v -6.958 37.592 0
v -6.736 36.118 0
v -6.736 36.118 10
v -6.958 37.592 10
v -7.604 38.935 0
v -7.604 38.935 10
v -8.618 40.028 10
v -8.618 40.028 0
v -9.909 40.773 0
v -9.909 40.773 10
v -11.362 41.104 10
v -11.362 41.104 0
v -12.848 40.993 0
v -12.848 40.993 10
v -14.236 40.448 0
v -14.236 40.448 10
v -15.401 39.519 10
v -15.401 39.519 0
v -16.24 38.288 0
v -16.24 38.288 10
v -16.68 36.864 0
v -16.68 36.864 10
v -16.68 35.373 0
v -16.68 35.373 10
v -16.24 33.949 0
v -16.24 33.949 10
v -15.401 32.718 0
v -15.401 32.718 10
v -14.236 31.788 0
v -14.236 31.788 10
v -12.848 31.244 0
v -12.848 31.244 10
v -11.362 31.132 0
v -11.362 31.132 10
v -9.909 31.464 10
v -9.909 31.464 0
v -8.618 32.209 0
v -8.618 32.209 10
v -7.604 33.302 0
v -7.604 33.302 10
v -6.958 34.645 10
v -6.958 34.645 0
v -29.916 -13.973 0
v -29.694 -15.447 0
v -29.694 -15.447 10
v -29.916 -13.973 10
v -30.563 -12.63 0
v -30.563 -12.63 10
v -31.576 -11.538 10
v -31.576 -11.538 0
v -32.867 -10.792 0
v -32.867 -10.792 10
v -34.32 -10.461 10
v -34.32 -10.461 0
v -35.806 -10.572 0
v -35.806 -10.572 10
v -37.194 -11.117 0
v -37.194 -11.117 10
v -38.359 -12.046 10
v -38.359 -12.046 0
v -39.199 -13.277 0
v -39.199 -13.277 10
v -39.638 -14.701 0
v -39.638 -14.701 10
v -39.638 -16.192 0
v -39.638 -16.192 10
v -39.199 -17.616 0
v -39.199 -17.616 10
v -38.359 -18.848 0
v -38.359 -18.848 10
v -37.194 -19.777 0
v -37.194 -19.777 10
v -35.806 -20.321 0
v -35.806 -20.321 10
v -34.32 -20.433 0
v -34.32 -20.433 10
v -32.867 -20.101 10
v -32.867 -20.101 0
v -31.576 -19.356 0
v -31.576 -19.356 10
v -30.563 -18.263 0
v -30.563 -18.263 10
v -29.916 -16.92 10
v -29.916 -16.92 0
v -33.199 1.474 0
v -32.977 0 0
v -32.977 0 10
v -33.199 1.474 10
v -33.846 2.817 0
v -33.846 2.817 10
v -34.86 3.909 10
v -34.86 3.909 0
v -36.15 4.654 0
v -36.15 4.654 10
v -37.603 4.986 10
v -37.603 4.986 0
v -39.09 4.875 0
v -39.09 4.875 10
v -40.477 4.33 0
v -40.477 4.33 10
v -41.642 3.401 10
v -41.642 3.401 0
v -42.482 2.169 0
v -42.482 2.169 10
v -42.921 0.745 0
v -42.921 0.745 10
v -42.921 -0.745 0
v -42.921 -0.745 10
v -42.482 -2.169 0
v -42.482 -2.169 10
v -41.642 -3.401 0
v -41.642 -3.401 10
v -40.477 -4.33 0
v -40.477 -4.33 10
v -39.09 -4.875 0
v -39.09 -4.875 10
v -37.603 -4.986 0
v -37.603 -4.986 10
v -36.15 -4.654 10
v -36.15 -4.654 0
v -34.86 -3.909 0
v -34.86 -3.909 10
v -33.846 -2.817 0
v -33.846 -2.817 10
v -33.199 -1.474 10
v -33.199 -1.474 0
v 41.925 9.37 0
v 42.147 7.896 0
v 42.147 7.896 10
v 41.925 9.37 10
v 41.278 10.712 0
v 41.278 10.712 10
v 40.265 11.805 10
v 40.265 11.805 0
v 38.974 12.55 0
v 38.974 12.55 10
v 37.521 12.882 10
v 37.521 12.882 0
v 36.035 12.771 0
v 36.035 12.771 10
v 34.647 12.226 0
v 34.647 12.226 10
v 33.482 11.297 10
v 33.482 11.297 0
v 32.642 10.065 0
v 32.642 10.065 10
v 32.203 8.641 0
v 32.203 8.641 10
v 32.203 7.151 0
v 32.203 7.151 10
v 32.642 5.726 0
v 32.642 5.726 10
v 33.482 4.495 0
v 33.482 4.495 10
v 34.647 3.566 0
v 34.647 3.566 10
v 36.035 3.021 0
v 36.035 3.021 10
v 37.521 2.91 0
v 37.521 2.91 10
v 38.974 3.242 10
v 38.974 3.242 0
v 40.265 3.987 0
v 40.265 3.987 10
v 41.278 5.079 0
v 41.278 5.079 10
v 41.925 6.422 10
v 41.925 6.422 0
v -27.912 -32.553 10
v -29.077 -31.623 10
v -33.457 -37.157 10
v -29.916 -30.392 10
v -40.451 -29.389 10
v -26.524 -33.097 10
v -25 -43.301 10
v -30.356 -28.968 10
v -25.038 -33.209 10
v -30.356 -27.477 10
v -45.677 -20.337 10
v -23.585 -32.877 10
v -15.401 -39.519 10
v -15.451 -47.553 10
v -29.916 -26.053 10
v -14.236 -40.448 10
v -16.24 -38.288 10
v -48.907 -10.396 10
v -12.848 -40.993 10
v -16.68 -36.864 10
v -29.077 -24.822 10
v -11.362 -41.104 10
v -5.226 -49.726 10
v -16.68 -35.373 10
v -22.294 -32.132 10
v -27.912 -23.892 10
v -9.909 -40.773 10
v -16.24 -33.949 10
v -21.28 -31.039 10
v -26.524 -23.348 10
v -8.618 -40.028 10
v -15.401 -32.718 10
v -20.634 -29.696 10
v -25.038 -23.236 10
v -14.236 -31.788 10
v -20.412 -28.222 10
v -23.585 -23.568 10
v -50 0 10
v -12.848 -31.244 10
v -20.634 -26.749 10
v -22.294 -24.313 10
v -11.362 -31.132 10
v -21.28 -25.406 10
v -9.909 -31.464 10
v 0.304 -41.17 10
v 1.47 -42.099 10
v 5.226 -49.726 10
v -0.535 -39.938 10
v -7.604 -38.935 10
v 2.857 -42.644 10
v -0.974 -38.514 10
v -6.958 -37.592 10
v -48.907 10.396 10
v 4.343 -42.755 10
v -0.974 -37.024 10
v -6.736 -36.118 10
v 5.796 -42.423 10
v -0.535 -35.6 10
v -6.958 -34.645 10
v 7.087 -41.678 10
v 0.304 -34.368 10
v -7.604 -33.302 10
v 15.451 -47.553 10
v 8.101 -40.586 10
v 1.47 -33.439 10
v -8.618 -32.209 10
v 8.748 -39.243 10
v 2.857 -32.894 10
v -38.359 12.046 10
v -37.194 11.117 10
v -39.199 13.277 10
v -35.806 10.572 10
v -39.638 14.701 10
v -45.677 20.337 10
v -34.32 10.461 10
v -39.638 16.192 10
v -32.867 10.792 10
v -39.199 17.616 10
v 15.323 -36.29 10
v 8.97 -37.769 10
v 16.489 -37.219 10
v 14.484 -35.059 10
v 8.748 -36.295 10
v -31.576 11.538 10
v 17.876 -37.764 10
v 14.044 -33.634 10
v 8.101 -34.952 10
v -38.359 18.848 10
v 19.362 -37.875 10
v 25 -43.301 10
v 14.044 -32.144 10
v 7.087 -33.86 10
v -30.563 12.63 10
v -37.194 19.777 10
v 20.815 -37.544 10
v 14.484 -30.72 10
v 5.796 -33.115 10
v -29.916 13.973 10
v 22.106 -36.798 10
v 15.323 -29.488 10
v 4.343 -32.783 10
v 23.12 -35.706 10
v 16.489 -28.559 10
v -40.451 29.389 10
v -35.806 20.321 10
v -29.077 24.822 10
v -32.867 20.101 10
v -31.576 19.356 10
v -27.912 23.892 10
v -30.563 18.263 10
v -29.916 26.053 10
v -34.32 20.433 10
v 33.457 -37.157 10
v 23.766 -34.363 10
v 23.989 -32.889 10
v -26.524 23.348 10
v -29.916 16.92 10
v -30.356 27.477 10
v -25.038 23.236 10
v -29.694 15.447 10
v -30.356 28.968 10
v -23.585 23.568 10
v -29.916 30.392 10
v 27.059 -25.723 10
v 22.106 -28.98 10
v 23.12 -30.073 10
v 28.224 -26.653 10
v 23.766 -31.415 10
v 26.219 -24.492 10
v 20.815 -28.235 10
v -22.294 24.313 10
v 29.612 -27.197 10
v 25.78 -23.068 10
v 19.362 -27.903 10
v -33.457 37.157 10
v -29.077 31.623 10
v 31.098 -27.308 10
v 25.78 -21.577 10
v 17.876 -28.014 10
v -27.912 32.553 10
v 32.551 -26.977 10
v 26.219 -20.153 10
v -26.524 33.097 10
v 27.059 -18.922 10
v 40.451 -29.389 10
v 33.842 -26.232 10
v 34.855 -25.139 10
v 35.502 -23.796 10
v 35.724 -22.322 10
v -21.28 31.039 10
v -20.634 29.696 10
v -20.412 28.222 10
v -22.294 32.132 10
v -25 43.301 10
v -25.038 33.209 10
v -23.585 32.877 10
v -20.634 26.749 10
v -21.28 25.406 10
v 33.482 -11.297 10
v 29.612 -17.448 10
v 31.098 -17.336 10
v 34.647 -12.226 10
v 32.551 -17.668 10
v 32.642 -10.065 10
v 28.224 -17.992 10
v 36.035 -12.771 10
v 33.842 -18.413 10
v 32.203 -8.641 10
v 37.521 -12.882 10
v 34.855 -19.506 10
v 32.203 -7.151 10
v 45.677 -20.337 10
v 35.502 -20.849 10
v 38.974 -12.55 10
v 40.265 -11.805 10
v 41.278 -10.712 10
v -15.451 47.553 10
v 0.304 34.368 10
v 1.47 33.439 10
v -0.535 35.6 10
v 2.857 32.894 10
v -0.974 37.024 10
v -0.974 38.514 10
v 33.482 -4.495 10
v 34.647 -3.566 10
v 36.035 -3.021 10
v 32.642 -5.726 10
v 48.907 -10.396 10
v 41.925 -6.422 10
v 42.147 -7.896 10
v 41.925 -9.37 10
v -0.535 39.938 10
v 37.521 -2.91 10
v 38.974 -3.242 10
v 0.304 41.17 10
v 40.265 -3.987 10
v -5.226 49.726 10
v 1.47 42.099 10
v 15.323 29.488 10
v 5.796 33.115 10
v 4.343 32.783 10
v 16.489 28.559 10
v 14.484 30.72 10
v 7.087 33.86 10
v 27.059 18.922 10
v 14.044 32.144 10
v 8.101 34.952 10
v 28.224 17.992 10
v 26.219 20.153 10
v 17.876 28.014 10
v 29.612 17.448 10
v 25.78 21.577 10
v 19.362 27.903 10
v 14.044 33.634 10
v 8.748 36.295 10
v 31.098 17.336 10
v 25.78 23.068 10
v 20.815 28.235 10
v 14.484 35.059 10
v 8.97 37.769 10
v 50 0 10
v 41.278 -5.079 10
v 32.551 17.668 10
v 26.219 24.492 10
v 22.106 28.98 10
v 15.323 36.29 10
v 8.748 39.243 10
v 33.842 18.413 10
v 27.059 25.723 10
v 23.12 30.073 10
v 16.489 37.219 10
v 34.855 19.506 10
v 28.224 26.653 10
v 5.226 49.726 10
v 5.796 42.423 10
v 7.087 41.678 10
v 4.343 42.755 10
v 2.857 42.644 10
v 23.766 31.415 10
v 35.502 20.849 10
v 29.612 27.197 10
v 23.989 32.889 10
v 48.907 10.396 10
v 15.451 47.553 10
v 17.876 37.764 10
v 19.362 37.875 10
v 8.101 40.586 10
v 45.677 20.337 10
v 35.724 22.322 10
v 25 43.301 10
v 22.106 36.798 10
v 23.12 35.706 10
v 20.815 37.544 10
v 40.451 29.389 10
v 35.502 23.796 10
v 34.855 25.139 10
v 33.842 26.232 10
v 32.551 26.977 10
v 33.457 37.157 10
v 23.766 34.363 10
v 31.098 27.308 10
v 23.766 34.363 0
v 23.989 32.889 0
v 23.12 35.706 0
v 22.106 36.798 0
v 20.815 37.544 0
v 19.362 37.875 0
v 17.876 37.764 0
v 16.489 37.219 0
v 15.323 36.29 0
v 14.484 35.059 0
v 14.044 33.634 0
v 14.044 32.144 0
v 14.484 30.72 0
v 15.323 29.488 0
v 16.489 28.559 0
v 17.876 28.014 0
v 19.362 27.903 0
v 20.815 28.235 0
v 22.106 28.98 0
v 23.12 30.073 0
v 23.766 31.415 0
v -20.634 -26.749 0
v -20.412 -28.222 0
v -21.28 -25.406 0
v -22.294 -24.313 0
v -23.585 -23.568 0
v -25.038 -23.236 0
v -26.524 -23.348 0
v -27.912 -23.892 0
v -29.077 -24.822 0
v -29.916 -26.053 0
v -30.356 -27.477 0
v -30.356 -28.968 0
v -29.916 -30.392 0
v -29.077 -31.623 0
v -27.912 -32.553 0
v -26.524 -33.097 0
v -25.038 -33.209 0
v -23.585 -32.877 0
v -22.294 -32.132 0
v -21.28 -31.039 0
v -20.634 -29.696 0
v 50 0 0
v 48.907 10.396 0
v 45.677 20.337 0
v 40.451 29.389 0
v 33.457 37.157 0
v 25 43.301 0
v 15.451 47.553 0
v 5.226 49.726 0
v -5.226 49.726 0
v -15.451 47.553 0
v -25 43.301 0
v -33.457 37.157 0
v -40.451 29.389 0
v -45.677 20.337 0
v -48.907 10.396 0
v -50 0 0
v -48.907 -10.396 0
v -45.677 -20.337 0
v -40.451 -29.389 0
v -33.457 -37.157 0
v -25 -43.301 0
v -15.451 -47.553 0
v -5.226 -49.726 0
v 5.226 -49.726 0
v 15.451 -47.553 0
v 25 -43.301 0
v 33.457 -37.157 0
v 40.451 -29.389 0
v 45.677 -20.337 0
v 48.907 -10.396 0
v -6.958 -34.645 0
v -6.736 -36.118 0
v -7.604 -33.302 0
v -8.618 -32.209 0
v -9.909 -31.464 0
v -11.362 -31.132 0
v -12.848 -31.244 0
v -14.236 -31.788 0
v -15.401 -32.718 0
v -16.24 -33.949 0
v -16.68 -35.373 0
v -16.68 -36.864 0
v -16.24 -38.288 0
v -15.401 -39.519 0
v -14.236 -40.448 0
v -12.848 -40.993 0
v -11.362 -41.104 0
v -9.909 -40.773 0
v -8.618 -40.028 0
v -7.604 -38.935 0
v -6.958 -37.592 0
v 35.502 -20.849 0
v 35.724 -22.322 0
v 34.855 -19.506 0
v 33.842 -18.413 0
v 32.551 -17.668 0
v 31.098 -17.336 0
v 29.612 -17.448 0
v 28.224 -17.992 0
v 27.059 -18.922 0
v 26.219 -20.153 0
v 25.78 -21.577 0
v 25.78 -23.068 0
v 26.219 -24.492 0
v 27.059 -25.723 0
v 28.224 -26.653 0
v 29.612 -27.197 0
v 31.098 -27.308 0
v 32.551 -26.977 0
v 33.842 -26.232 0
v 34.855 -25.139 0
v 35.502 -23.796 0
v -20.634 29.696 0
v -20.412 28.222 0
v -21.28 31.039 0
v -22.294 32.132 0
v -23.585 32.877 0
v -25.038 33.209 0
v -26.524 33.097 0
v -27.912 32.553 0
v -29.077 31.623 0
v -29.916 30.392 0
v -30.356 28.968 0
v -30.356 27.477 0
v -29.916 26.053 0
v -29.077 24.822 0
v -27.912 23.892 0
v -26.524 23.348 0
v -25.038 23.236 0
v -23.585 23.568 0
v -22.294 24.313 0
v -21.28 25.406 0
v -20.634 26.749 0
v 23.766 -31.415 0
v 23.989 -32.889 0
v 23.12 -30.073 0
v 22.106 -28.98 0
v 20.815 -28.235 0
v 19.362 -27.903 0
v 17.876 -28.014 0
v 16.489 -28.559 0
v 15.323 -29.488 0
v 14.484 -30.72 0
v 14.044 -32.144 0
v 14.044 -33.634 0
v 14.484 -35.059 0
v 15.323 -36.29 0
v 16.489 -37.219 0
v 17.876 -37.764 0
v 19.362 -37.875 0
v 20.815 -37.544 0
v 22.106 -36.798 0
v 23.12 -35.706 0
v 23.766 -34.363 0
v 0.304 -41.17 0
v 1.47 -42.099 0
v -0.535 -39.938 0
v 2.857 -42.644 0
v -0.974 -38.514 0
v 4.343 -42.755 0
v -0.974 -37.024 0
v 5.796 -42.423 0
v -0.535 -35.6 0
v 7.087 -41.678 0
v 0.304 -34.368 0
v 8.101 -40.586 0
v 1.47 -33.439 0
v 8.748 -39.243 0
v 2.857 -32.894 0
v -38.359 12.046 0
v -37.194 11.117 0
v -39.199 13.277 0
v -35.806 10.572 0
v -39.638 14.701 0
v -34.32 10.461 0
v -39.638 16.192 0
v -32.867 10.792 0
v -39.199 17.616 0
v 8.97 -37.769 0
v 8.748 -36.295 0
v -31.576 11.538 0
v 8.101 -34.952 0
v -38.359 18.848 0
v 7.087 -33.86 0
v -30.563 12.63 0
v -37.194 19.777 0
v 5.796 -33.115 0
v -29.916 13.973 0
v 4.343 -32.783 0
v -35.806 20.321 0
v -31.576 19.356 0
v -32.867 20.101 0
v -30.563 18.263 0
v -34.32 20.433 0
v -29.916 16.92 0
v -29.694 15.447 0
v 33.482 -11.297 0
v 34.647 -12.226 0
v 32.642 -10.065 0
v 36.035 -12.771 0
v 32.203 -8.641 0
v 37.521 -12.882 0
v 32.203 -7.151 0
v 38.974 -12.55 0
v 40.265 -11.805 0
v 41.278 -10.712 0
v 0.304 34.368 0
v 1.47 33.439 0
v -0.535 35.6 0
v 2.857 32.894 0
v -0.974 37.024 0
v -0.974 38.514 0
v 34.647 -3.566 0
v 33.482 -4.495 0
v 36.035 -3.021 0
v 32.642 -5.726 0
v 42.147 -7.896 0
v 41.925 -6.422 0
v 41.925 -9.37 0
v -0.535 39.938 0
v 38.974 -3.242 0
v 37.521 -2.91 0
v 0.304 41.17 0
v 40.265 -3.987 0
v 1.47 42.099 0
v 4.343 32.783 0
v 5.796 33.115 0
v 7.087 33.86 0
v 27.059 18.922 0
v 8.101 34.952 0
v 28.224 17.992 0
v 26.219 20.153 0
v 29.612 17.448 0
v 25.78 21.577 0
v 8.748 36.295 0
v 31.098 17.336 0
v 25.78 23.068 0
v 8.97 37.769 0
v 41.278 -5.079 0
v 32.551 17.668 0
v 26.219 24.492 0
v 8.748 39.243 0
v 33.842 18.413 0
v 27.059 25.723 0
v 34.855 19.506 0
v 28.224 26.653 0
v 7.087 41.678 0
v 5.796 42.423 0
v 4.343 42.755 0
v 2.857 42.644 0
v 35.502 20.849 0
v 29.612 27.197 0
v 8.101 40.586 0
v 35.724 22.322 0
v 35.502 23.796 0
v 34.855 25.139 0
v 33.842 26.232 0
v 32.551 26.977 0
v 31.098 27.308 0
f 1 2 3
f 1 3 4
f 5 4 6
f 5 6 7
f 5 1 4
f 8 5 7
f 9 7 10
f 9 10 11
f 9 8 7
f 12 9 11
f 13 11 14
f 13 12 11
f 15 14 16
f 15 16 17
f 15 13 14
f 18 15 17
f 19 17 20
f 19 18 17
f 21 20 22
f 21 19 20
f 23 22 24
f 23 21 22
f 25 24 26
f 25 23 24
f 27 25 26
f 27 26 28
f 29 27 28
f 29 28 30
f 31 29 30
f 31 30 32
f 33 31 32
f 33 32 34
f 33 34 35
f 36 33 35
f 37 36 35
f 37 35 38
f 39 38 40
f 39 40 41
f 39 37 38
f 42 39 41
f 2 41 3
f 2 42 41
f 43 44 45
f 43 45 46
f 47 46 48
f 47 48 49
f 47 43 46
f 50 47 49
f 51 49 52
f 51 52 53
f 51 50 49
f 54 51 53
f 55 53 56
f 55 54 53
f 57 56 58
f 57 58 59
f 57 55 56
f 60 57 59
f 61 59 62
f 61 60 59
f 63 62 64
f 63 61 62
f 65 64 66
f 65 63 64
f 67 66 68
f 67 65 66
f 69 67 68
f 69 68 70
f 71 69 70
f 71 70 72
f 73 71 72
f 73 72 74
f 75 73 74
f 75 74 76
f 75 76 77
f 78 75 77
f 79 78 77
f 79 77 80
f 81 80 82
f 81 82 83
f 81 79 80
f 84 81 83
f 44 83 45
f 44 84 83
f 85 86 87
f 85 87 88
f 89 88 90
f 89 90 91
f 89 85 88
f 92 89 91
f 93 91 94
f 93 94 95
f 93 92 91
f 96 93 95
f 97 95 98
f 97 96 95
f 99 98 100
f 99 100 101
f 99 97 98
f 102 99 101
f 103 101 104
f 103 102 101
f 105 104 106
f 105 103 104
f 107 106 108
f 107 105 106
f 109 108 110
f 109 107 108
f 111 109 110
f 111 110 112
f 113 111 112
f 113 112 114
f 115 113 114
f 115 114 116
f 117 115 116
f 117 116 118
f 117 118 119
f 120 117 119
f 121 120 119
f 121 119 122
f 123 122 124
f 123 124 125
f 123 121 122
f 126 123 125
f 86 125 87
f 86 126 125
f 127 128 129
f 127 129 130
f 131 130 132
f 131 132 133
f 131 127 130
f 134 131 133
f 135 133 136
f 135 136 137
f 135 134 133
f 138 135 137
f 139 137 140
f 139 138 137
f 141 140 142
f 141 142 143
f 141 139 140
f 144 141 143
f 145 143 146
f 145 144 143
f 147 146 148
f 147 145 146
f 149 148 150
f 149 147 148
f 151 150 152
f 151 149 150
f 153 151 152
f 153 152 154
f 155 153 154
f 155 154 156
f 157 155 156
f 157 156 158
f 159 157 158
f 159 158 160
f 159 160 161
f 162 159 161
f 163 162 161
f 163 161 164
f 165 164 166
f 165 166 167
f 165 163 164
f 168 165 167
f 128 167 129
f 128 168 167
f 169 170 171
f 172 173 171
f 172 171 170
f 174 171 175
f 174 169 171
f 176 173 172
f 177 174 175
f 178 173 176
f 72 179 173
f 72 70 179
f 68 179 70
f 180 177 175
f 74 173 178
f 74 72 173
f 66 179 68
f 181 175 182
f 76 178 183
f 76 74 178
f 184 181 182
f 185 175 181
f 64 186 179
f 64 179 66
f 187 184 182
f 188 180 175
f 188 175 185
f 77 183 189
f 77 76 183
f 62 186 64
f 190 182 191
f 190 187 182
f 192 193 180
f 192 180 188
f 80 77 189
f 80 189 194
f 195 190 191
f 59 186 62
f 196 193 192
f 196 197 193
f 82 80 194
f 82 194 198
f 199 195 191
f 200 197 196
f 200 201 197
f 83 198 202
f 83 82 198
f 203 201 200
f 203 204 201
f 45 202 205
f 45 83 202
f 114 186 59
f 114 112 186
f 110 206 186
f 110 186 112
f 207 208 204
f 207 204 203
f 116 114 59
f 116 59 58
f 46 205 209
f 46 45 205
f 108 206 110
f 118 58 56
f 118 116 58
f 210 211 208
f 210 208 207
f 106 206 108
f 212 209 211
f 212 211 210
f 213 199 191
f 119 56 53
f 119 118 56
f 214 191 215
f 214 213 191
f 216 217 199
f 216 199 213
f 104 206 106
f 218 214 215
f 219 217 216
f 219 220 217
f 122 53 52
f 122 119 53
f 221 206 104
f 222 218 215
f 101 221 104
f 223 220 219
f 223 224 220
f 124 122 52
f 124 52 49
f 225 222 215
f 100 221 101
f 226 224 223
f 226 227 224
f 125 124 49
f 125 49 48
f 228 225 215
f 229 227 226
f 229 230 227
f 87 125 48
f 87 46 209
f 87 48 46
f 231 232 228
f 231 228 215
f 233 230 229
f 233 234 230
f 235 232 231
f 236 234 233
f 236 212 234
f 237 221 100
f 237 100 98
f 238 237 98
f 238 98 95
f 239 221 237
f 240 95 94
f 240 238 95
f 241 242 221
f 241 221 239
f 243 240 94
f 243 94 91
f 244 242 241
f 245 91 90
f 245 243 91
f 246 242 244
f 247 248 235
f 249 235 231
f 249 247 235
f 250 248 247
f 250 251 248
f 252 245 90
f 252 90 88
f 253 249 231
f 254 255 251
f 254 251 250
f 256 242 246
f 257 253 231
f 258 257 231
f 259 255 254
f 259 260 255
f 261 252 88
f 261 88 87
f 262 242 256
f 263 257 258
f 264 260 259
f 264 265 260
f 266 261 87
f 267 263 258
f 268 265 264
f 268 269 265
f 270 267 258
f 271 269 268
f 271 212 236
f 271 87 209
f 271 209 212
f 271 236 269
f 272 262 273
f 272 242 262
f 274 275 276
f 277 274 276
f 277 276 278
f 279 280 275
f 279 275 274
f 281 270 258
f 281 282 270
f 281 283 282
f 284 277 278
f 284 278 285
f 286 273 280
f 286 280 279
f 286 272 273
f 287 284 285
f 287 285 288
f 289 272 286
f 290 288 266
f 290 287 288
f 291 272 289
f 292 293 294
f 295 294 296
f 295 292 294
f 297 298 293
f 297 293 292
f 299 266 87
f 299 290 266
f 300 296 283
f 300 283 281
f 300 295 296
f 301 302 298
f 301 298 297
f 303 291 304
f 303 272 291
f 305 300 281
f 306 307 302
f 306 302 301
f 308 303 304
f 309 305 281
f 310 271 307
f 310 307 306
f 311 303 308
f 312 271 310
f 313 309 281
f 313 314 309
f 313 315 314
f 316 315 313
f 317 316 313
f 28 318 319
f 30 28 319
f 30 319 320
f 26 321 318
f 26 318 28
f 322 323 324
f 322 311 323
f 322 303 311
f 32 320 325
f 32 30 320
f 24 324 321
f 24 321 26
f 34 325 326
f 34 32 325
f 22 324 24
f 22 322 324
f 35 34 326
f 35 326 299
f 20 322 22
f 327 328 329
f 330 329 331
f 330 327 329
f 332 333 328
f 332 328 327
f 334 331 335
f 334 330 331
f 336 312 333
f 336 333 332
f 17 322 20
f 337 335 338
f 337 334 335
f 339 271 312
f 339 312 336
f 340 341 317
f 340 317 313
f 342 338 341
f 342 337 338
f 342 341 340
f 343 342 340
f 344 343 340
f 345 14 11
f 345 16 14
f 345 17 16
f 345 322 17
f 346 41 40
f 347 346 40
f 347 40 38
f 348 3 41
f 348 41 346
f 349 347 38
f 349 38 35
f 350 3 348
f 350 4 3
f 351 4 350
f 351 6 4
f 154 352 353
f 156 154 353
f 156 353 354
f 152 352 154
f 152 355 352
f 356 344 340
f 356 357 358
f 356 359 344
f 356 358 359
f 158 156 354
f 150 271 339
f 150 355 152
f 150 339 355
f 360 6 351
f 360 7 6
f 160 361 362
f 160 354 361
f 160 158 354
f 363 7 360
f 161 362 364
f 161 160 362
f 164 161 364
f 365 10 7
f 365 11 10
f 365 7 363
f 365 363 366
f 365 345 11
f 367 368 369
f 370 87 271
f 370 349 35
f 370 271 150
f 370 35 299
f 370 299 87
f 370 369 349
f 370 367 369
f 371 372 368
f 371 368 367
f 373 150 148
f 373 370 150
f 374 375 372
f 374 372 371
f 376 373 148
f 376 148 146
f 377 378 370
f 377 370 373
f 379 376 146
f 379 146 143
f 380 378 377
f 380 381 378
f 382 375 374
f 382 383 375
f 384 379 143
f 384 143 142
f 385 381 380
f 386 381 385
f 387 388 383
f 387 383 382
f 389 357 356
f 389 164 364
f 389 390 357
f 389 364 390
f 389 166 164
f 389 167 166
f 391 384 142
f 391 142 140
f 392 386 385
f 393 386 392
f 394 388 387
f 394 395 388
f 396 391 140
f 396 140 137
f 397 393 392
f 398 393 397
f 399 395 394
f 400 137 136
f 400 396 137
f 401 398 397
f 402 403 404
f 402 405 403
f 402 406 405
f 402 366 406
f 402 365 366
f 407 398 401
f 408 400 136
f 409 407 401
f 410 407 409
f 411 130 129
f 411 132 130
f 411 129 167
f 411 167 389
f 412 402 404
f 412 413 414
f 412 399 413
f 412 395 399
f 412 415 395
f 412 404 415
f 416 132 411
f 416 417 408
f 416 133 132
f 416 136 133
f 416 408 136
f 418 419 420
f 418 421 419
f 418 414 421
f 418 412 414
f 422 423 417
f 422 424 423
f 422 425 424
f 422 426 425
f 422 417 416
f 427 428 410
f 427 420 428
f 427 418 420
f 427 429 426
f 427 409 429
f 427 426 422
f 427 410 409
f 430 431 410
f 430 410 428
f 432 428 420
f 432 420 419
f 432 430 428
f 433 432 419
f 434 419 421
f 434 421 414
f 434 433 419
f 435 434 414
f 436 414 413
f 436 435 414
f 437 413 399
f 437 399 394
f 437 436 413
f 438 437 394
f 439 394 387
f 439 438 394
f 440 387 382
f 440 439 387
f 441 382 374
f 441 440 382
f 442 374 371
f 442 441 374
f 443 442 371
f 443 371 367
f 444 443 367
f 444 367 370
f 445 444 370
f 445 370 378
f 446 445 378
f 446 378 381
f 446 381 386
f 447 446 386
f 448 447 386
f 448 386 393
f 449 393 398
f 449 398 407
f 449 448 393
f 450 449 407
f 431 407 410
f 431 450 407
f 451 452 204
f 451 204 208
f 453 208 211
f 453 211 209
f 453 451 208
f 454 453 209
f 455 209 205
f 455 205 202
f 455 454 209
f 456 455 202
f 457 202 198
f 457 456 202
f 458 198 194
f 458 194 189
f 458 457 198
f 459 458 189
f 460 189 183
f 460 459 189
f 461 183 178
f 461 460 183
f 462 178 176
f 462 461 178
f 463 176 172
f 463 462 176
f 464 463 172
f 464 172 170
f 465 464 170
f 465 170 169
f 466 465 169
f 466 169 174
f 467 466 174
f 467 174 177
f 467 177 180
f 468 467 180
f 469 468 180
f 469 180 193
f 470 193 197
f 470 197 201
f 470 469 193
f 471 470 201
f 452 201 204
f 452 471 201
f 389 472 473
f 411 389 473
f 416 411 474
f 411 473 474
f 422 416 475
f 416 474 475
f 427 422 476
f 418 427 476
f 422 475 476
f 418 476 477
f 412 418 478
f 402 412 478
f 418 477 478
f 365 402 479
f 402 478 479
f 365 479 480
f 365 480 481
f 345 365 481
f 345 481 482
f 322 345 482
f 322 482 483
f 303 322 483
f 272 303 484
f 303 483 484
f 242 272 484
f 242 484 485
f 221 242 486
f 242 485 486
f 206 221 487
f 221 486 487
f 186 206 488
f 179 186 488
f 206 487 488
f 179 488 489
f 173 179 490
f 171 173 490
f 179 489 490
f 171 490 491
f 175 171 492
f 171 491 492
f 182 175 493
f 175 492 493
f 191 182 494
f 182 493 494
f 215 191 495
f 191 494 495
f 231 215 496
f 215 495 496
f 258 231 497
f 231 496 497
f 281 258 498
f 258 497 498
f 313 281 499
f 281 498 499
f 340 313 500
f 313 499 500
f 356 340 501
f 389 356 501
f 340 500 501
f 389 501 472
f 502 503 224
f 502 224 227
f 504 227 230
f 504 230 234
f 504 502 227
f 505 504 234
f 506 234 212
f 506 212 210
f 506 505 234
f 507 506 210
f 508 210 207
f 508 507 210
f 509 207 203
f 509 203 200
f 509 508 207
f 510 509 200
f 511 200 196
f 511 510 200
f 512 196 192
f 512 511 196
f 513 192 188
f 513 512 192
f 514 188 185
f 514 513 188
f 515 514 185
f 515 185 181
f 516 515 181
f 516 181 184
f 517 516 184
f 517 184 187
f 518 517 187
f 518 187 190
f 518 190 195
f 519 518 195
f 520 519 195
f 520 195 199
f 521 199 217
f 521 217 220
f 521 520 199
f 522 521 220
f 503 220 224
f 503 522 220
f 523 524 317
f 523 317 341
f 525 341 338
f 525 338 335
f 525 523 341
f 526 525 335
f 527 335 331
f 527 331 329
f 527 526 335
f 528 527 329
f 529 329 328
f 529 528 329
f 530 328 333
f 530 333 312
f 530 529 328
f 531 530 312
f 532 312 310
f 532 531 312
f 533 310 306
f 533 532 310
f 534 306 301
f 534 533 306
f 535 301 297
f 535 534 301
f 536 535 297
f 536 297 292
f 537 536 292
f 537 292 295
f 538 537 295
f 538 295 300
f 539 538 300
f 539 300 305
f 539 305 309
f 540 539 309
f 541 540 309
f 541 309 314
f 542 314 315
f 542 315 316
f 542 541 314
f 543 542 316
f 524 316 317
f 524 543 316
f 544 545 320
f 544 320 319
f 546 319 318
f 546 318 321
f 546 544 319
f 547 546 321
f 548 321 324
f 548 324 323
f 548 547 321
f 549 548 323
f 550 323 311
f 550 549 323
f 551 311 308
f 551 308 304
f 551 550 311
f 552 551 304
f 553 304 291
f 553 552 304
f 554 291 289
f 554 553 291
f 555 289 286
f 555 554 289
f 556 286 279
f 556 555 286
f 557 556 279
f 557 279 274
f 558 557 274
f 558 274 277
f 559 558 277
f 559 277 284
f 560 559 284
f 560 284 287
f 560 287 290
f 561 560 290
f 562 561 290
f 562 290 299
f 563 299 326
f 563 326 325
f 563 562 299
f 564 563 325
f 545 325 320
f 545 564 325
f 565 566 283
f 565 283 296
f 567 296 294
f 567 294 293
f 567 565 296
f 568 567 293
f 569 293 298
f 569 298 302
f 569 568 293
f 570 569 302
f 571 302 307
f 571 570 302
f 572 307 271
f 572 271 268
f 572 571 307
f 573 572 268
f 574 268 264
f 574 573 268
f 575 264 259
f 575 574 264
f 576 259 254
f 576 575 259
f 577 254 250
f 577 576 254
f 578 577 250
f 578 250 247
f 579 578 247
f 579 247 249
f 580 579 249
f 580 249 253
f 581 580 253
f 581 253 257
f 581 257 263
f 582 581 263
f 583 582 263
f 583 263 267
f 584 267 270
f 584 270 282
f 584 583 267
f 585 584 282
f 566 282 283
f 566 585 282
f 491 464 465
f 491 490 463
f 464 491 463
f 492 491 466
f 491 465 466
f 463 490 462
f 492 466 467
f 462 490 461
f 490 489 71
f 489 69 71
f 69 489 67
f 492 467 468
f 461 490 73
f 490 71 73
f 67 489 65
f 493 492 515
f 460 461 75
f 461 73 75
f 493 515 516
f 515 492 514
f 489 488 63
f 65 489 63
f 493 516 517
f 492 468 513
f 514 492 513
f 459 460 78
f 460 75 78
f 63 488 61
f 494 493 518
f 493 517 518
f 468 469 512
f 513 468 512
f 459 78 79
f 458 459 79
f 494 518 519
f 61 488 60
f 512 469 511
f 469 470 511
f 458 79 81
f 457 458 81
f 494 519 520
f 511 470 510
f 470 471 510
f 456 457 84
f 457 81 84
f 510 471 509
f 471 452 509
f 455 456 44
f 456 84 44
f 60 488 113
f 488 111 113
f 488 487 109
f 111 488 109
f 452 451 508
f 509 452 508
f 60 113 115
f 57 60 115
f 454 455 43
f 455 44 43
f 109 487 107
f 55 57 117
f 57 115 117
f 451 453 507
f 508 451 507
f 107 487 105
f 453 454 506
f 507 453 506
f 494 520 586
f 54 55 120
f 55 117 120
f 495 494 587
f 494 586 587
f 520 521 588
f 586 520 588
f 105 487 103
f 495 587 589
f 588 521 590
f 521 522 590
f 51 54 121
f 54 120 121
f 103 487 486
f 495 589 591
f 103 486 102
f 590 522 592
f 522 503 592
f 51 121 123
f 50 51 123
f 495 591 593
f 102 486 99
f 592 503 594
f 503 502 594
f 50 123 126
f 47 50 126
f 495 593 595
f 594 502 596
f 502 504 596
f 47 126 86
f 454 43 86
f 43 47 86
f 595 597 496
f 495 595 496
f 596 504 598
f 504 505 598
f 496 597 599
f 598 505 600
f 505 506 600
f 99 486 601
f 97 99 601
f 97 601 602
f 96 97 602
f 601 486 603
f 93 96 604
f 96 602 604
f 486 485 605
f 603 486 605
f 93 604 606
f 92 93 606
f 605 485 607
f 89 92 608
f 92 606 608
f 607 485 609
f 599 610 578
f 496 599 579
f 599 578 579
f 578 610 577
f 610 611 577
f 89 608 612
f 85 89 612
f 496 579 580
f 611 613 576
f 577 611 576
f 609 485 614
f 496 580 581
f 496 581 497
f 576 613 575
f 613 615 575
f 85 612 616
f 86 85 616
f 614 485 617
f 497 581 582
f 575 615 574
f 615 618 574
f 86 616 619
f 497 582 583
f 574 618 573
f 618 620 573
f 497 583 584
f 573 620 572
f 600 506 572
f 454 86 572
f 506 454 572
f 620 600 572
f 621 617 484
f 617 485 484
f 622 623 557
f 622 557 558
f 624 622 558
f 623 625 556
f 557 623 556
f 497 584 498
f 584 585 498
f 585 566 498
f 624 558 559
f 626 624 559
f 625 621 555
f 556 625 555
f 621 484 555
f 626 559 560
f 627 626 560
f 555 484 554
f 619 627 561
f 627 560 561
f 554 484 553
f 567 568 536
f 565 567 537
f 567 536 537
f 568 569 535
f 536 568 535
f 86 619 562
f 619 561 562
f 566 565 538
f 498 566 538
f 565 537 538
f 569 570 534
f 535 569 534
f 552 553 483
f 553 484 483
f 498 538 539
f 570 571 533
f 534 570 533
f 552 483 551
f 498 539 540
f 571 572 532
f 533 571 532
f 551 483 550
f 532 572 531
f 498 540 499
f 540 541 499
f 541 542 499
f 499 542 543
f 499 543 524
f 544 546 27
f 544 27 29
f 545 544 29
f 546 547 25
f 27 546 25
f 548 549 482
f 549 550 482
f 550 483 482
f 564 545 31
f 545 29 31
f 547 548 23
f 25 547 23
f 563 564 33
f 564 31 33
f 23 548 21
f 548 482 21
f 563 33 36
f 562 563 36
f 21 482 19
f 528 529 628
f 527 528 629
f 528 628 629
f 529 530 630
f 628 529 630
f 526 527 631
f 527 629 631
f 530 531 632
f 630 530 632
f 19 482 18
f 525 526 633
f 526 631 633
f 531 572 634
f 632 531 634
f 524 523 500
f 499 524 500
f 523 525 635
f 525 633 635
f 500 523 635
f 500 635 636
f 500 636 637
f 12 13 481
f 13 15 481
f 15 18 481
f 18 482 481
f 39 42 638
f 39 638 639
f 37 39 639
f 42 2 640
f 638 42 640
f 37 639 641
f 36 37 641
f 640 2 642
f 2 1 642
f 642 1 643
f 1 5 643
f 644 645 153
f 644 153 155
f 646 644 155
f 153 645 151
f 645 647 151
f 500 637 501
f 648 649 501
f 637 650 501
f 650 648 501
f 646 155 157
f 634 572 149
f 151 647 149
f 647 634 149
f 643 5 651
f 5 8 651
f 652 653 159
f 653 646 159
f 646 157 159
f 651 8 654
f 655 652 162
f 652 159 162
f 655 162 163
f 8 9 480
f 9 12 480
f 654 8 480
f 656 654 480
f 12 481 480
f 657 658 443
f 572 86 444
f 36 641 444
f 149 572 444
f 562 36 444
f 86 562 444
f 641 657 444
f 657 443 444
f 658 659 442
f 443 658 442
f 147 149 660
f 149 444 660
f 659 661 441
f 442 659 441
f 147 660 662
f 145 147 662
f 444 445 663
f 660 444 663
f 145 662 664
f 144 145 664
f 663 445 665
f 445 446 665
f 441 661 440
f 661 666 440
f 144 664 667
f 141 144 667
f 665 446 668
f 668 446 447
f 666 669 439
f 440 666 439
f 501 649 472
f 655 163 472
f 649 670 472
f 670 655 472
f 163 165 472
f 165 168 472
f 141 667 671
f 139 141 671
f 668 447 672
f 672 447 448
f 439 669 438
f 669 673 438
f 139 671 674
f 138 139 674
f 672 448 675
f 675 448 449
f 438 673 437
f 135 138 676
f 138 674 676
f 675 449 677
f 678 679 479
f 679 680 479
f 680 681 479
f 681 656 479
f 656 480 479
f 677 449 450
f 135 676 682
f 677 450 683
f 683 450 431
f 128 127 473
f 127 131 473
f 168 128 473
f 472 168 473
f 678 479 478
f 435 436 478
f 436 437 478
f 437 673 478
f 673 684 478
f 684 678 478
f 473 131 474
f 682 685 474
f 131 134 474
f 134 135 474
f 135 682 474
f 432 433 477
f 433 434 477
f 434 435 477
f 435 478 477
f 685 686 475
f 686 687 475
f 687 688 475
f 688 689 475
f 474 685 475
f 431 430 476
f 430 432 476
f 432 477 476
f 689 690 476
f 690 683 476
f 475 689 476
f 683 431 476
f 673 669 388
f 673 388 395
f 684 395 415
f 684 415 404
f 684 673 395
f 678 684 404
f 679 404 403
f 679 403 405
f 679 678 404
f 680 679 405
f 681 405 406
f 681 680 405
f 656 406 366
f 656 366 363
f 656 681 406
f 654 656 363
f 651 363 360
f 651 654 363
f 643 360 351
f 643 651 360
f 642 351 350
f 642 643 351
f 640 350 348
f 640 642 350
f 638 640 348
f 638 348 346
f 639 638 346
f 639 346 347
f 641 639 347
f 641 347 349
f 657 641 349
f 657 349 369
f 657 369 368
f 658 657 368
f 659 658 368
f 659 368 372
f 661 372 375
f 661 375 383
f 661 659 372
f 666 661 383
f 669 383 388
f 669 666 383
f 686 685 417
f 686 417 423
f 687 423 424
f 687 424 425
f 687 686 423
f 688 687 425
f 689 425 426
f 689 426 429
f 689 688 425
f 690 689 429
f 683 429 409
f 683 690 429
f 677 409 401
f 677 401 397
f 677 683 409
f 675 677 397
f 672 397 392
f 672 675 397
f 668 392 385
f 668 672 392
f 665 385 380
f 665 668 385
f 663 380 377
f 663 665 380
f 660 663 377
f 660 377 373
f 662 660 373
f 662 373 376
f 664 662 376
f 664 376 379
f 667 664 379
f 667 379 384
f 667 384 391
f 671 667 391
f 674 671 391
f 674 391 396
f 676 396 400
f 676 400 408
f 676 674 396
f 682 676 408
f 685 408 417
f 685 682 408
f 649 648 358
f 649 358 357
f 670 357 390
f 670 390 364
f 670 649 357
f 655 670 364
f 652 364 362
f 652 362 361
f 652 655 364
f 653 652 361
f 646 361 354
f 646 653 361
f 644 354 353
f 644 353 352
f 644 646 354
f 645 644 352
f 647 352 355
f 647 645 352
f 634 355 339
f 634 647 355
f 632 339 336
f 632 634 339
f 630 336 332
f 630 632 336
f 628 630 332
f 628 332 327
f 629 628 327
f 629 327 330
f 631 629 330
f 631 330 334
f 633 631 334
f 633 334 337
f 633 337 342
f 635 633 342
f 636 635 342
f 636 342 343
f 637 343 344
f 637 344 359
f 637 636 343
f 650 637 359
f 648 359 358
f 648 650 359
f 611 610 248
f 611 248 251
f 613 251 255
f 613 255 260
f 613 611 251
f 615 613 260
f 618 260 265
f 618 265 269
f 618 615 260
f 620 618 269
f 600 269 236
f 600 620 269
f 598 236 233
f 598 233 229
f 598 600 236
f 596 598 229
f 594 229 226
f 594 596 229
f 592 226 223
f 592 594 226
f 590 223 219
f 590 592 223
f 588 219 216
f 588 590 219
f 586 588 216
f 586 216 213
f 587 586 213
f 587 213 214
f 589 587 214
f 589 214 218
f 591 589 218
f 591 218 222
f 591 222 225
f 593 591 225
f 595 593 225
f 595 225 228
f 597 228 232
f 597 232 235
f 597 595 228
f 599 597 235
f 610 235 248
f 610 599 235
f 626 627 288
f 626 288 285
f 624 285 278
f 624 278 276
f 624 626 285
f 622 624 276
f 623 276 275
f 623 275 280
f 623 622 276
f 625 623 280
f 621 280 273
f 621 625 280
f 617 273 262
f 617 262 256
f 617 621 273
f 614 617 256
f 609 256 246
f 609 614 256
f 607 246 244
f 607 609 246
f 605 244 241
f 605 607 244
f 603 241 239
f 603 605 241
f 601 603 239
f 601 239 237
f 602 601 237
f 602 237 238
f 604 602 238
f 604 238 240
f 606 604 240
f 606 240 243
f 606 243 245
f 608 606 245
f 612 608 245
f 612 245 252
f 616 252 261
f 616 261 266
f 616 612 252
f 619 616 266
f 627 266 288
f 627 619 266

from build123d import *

# Parameters (mm, degrees)
CROQUIS1_R              = 50
CROQUIS1_R_2            = 5
SALIENTE_EXTRUIR1_DEPTH = 10


with BuildPart() as part:
    # Croquis1 → Saliente-Extruir1 (new body)
    with BuildSketch(Plane.XY):
        Circle(CROQUIS1_R)
        with Locations((-37.977099237, 0)):
            Circle(CROQUIS1_R_2, mode=Mode.SUBTRACT)
        with Locations((-34.693806502, 15.446677857)):
            Circle(CROQUIS1_R_2, mode=Mode.SUBTRACT)
        with Locations((-25.41163944, 28.222484784)):
            Circle(CROQUIS1_R_2, mode=Mode.SUBTRACT)
        with Locations((-11.735569061, 36.118367699)):
            Circle(CROQUIS1_R_2, mode=Mode.SUBTRACT)
        with Locations((3.969687823, 37.769056713)):
            Circle(CROQUIS1_R_2, mode=Mode.SUBTRACT)
        with Locations((18.988549618, 32.889132701)):
            Circle(CROQUIS1_R_2, mode=Mode.SUBTRACT)
        with Locations((30.72411868, 22.322378856)):
            Circle(CROQUIS1_R_2, mode=Mode.SUBTRACT)
        with Locations((37.147208501, 7.895882915)):
            Circle(CROQUIS1_R_2, mode=Mode.SUBTRACT)
        with Locations((37.147208501, -7.895882915)):
            Circle(CROQUIS1_R_2, mode=Mode.SUBTRACT)
        with Locations((30.72411868, -22.322378856)):
            Circle(CROQUIS1_R_2, mode=Mode.SUBTRACT)
        with Locations((18.988549618, -32.889132701)):
            Circle(CROQUIS1_R_2, mode=Mode.SUBTRACT)
        with Locations((3.969687823, -37.769056713)):
            Circle(CROQUIS1_R_2, mode=Mode.SUBTRACT)
        with Locations((-11.735569061, -36.118367699)):
            Circle(CROQUIS1_R_2, mode=Mode.SUBTRACT)
        with Locations((-25.41163944, -28.222484784)):
            Circle(CROQUIS1_R_2, mode=Mode.SUBTRACT)
        with Locations((-34.693806502, -15.446677857)):
            Circle(CROQUIS1_R_2, mode=Mode.SUBTRACT)
    extrude(amount=SALIENTE_EXTRUIR1_DEPTH)


solid = part.part
